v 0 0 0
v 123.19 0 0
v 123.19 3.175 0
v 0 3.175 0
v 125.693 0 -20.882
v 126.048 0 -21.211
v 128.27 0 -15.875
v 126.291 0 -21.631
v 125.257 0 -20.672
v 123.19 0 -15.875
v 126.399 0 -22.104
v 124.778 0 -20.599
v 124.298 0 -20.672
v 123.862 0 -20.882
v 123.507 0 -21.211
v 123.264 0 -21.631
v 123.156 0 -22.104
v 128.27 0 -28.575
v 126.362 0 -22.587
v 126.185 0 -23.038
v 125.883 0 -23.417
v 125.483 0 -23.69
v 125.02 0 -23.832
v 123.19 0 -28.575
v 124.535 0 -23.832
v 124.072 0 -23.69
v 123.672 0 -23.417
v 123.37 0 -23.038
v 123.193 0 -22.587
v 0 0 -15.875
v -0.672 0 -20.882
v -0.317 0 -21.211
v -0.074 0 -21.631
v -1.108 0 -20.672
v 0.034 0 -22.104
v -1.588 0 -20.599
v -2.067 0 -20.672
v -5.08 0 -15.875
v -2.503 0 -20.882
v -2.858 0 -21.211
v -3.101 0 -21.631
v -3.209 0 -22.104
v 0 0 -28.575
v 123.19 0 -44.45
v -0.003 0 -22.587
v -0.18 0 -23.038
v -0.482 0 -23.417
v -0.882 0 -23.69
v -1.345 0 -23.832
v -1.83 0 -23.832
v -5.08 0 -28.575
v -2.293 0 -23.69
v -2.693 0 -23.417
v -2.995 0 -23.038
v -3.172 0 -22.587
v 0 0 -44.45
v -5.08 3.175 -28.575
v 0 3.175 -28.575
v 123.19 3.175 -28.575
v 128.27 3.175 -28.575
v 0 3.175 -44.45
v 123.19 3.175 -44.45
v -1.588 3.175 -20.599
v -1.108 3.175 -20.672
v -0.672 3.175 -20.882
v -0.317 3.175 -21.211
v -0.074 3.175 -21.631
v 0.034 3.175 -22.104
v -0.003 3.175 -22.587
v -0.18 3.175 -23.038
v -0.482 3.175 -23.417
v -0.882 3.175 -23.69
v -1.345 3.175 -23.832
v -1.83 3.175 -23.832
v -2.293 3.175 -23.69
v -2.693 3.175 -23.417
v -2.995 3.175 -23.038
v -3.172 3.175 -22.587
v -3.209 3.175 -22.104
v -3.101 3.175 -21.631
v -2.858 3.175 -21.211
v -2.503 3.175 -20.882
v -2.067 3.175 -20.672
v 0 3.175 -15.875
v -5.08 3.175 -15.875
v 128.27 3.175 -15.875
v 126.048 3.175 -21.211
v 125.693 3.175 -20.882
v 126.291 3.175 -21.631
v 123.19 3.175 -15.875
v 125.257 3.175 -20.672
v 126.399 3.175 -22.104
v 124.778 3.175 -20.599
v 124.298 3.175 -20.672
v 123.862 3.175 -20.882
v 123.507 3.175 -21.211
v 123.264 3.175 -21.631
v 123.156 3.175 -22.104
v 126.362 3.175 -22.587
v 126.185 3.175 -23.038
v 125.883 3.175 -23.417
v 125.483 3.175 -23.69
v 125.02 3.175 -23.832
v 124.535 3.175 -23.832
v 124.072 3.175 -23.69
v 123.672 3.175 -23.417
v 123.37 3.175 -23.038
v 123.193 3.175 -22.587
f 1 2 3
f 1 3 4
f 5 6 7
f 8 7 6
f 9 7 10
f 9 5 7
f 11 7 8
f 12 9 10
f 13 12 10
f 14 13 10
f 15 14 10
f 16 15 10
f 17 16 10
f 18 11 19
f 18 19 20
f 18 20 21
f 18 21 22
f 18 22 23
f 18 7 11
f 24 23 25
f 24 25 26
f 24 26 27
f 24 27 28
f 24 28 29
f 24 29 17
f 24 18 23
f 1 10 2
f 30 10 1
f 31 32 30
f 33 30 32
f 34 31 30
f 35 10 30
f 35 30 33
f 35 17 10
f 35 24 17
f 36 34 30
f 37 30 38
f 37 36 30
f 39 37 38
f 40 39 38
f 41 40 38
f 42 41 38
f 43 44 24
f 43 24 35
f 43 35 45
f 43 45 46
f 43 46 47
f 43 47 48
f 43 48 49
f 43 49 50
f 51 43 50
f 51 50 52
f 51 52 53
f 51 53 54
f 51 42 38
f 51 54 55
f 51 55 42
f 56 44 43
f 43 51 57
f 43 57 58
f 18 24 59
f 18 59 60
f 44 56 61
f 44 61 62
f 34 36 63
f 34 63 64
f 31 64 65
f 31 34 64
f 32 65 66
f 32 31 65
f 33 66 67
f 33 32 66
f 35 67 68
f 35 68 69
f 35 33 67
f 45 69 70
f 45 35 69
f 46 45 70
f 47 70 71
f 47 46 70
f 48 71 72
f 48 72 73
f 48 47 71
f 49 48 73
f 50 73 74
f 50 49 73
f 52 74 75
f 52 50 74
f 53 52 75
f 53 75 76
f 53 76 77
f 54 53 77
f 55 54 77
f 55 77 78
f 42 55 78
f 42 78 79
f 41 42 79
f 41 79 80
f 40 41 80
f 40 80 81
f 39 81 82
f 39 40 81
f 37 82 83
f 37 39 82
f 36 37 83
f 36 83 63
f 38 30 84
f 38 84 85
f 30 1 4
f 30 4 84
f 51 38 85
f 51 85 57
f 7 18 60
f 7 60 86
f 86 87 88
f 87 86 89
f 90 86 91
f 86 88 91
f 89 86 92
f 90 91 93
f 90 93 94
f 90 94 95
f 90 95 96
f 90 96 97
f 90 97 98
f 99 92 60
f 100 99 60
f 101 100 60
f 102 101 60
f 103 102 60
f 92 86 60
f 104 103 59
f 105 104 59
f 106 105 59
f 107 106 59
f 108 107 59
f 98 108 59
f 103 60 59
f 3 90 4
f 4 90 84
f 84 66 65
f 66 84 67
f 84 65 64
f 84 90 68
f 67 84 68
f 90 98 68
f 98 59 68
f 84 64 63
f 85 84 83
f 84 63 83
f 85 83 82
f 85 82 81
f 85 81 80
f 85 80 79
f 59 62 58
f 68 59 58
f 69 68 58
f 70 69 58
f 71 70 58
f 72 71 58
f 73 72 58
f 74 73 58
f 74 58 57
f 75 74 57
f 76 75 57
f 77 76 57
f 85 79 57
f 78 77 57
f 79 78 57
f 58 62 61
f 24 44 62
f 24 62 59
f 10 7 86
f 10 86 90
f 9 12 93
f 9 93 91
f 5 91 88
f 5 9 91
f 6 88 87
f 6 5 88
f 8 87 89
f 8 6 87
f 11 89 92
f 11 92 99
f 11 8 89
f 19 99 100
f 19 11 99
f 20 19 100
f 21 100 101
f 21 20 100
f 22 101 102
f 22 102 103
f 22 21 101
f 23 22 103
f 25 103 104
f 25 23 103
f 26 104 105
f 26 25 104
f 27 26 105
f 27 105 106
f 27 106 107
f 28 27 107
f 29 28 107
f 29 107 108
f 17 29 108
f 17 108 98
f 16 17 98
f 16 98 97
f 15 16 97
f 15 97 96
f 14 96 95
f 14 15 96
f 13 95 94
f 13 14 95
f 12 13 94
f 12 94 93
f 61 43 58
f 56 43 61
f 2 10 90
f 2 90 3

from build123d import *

# Parameters (mm, degrees)
SKETCH1_R           = 1.6256
BOSS_EXTRUDE1_DEPTH = 3.175


with BuildPart() as part:
    # Sketch1 → Boss-Extrude1 (new body)
    with BuildSketch(Plane(origin=(0, 0, 0), x_dir=(1, 0, 0), z_dir=(0, 1, 0))):
        Polygon((0, 28.575), (0, 44.45), (123.19, 44.45), (123.19, 28.575), (128.27, 28.575), (128.27, 15.875), (123.19, 15.875), (123.19, 0), (0, 0), (0, 15.875), (-5.08, 15.875), (-5.08, 28.575), align=None)
        with Locations(Location((-1.5875, 22.225, 0), (0, 0, 270))):
            Circle(SKETCH1_R, mode=Mode.SUBTRACT)
        with Locations(Location((124.7775, 22.225, 0), (0, 0, 270))):
            Circle(SKETCH1_R, mode=Mode.SUBTRACT)
    extrude(amount=BOSS_EXTRUDE1_DEPTH)


solid = part.part
